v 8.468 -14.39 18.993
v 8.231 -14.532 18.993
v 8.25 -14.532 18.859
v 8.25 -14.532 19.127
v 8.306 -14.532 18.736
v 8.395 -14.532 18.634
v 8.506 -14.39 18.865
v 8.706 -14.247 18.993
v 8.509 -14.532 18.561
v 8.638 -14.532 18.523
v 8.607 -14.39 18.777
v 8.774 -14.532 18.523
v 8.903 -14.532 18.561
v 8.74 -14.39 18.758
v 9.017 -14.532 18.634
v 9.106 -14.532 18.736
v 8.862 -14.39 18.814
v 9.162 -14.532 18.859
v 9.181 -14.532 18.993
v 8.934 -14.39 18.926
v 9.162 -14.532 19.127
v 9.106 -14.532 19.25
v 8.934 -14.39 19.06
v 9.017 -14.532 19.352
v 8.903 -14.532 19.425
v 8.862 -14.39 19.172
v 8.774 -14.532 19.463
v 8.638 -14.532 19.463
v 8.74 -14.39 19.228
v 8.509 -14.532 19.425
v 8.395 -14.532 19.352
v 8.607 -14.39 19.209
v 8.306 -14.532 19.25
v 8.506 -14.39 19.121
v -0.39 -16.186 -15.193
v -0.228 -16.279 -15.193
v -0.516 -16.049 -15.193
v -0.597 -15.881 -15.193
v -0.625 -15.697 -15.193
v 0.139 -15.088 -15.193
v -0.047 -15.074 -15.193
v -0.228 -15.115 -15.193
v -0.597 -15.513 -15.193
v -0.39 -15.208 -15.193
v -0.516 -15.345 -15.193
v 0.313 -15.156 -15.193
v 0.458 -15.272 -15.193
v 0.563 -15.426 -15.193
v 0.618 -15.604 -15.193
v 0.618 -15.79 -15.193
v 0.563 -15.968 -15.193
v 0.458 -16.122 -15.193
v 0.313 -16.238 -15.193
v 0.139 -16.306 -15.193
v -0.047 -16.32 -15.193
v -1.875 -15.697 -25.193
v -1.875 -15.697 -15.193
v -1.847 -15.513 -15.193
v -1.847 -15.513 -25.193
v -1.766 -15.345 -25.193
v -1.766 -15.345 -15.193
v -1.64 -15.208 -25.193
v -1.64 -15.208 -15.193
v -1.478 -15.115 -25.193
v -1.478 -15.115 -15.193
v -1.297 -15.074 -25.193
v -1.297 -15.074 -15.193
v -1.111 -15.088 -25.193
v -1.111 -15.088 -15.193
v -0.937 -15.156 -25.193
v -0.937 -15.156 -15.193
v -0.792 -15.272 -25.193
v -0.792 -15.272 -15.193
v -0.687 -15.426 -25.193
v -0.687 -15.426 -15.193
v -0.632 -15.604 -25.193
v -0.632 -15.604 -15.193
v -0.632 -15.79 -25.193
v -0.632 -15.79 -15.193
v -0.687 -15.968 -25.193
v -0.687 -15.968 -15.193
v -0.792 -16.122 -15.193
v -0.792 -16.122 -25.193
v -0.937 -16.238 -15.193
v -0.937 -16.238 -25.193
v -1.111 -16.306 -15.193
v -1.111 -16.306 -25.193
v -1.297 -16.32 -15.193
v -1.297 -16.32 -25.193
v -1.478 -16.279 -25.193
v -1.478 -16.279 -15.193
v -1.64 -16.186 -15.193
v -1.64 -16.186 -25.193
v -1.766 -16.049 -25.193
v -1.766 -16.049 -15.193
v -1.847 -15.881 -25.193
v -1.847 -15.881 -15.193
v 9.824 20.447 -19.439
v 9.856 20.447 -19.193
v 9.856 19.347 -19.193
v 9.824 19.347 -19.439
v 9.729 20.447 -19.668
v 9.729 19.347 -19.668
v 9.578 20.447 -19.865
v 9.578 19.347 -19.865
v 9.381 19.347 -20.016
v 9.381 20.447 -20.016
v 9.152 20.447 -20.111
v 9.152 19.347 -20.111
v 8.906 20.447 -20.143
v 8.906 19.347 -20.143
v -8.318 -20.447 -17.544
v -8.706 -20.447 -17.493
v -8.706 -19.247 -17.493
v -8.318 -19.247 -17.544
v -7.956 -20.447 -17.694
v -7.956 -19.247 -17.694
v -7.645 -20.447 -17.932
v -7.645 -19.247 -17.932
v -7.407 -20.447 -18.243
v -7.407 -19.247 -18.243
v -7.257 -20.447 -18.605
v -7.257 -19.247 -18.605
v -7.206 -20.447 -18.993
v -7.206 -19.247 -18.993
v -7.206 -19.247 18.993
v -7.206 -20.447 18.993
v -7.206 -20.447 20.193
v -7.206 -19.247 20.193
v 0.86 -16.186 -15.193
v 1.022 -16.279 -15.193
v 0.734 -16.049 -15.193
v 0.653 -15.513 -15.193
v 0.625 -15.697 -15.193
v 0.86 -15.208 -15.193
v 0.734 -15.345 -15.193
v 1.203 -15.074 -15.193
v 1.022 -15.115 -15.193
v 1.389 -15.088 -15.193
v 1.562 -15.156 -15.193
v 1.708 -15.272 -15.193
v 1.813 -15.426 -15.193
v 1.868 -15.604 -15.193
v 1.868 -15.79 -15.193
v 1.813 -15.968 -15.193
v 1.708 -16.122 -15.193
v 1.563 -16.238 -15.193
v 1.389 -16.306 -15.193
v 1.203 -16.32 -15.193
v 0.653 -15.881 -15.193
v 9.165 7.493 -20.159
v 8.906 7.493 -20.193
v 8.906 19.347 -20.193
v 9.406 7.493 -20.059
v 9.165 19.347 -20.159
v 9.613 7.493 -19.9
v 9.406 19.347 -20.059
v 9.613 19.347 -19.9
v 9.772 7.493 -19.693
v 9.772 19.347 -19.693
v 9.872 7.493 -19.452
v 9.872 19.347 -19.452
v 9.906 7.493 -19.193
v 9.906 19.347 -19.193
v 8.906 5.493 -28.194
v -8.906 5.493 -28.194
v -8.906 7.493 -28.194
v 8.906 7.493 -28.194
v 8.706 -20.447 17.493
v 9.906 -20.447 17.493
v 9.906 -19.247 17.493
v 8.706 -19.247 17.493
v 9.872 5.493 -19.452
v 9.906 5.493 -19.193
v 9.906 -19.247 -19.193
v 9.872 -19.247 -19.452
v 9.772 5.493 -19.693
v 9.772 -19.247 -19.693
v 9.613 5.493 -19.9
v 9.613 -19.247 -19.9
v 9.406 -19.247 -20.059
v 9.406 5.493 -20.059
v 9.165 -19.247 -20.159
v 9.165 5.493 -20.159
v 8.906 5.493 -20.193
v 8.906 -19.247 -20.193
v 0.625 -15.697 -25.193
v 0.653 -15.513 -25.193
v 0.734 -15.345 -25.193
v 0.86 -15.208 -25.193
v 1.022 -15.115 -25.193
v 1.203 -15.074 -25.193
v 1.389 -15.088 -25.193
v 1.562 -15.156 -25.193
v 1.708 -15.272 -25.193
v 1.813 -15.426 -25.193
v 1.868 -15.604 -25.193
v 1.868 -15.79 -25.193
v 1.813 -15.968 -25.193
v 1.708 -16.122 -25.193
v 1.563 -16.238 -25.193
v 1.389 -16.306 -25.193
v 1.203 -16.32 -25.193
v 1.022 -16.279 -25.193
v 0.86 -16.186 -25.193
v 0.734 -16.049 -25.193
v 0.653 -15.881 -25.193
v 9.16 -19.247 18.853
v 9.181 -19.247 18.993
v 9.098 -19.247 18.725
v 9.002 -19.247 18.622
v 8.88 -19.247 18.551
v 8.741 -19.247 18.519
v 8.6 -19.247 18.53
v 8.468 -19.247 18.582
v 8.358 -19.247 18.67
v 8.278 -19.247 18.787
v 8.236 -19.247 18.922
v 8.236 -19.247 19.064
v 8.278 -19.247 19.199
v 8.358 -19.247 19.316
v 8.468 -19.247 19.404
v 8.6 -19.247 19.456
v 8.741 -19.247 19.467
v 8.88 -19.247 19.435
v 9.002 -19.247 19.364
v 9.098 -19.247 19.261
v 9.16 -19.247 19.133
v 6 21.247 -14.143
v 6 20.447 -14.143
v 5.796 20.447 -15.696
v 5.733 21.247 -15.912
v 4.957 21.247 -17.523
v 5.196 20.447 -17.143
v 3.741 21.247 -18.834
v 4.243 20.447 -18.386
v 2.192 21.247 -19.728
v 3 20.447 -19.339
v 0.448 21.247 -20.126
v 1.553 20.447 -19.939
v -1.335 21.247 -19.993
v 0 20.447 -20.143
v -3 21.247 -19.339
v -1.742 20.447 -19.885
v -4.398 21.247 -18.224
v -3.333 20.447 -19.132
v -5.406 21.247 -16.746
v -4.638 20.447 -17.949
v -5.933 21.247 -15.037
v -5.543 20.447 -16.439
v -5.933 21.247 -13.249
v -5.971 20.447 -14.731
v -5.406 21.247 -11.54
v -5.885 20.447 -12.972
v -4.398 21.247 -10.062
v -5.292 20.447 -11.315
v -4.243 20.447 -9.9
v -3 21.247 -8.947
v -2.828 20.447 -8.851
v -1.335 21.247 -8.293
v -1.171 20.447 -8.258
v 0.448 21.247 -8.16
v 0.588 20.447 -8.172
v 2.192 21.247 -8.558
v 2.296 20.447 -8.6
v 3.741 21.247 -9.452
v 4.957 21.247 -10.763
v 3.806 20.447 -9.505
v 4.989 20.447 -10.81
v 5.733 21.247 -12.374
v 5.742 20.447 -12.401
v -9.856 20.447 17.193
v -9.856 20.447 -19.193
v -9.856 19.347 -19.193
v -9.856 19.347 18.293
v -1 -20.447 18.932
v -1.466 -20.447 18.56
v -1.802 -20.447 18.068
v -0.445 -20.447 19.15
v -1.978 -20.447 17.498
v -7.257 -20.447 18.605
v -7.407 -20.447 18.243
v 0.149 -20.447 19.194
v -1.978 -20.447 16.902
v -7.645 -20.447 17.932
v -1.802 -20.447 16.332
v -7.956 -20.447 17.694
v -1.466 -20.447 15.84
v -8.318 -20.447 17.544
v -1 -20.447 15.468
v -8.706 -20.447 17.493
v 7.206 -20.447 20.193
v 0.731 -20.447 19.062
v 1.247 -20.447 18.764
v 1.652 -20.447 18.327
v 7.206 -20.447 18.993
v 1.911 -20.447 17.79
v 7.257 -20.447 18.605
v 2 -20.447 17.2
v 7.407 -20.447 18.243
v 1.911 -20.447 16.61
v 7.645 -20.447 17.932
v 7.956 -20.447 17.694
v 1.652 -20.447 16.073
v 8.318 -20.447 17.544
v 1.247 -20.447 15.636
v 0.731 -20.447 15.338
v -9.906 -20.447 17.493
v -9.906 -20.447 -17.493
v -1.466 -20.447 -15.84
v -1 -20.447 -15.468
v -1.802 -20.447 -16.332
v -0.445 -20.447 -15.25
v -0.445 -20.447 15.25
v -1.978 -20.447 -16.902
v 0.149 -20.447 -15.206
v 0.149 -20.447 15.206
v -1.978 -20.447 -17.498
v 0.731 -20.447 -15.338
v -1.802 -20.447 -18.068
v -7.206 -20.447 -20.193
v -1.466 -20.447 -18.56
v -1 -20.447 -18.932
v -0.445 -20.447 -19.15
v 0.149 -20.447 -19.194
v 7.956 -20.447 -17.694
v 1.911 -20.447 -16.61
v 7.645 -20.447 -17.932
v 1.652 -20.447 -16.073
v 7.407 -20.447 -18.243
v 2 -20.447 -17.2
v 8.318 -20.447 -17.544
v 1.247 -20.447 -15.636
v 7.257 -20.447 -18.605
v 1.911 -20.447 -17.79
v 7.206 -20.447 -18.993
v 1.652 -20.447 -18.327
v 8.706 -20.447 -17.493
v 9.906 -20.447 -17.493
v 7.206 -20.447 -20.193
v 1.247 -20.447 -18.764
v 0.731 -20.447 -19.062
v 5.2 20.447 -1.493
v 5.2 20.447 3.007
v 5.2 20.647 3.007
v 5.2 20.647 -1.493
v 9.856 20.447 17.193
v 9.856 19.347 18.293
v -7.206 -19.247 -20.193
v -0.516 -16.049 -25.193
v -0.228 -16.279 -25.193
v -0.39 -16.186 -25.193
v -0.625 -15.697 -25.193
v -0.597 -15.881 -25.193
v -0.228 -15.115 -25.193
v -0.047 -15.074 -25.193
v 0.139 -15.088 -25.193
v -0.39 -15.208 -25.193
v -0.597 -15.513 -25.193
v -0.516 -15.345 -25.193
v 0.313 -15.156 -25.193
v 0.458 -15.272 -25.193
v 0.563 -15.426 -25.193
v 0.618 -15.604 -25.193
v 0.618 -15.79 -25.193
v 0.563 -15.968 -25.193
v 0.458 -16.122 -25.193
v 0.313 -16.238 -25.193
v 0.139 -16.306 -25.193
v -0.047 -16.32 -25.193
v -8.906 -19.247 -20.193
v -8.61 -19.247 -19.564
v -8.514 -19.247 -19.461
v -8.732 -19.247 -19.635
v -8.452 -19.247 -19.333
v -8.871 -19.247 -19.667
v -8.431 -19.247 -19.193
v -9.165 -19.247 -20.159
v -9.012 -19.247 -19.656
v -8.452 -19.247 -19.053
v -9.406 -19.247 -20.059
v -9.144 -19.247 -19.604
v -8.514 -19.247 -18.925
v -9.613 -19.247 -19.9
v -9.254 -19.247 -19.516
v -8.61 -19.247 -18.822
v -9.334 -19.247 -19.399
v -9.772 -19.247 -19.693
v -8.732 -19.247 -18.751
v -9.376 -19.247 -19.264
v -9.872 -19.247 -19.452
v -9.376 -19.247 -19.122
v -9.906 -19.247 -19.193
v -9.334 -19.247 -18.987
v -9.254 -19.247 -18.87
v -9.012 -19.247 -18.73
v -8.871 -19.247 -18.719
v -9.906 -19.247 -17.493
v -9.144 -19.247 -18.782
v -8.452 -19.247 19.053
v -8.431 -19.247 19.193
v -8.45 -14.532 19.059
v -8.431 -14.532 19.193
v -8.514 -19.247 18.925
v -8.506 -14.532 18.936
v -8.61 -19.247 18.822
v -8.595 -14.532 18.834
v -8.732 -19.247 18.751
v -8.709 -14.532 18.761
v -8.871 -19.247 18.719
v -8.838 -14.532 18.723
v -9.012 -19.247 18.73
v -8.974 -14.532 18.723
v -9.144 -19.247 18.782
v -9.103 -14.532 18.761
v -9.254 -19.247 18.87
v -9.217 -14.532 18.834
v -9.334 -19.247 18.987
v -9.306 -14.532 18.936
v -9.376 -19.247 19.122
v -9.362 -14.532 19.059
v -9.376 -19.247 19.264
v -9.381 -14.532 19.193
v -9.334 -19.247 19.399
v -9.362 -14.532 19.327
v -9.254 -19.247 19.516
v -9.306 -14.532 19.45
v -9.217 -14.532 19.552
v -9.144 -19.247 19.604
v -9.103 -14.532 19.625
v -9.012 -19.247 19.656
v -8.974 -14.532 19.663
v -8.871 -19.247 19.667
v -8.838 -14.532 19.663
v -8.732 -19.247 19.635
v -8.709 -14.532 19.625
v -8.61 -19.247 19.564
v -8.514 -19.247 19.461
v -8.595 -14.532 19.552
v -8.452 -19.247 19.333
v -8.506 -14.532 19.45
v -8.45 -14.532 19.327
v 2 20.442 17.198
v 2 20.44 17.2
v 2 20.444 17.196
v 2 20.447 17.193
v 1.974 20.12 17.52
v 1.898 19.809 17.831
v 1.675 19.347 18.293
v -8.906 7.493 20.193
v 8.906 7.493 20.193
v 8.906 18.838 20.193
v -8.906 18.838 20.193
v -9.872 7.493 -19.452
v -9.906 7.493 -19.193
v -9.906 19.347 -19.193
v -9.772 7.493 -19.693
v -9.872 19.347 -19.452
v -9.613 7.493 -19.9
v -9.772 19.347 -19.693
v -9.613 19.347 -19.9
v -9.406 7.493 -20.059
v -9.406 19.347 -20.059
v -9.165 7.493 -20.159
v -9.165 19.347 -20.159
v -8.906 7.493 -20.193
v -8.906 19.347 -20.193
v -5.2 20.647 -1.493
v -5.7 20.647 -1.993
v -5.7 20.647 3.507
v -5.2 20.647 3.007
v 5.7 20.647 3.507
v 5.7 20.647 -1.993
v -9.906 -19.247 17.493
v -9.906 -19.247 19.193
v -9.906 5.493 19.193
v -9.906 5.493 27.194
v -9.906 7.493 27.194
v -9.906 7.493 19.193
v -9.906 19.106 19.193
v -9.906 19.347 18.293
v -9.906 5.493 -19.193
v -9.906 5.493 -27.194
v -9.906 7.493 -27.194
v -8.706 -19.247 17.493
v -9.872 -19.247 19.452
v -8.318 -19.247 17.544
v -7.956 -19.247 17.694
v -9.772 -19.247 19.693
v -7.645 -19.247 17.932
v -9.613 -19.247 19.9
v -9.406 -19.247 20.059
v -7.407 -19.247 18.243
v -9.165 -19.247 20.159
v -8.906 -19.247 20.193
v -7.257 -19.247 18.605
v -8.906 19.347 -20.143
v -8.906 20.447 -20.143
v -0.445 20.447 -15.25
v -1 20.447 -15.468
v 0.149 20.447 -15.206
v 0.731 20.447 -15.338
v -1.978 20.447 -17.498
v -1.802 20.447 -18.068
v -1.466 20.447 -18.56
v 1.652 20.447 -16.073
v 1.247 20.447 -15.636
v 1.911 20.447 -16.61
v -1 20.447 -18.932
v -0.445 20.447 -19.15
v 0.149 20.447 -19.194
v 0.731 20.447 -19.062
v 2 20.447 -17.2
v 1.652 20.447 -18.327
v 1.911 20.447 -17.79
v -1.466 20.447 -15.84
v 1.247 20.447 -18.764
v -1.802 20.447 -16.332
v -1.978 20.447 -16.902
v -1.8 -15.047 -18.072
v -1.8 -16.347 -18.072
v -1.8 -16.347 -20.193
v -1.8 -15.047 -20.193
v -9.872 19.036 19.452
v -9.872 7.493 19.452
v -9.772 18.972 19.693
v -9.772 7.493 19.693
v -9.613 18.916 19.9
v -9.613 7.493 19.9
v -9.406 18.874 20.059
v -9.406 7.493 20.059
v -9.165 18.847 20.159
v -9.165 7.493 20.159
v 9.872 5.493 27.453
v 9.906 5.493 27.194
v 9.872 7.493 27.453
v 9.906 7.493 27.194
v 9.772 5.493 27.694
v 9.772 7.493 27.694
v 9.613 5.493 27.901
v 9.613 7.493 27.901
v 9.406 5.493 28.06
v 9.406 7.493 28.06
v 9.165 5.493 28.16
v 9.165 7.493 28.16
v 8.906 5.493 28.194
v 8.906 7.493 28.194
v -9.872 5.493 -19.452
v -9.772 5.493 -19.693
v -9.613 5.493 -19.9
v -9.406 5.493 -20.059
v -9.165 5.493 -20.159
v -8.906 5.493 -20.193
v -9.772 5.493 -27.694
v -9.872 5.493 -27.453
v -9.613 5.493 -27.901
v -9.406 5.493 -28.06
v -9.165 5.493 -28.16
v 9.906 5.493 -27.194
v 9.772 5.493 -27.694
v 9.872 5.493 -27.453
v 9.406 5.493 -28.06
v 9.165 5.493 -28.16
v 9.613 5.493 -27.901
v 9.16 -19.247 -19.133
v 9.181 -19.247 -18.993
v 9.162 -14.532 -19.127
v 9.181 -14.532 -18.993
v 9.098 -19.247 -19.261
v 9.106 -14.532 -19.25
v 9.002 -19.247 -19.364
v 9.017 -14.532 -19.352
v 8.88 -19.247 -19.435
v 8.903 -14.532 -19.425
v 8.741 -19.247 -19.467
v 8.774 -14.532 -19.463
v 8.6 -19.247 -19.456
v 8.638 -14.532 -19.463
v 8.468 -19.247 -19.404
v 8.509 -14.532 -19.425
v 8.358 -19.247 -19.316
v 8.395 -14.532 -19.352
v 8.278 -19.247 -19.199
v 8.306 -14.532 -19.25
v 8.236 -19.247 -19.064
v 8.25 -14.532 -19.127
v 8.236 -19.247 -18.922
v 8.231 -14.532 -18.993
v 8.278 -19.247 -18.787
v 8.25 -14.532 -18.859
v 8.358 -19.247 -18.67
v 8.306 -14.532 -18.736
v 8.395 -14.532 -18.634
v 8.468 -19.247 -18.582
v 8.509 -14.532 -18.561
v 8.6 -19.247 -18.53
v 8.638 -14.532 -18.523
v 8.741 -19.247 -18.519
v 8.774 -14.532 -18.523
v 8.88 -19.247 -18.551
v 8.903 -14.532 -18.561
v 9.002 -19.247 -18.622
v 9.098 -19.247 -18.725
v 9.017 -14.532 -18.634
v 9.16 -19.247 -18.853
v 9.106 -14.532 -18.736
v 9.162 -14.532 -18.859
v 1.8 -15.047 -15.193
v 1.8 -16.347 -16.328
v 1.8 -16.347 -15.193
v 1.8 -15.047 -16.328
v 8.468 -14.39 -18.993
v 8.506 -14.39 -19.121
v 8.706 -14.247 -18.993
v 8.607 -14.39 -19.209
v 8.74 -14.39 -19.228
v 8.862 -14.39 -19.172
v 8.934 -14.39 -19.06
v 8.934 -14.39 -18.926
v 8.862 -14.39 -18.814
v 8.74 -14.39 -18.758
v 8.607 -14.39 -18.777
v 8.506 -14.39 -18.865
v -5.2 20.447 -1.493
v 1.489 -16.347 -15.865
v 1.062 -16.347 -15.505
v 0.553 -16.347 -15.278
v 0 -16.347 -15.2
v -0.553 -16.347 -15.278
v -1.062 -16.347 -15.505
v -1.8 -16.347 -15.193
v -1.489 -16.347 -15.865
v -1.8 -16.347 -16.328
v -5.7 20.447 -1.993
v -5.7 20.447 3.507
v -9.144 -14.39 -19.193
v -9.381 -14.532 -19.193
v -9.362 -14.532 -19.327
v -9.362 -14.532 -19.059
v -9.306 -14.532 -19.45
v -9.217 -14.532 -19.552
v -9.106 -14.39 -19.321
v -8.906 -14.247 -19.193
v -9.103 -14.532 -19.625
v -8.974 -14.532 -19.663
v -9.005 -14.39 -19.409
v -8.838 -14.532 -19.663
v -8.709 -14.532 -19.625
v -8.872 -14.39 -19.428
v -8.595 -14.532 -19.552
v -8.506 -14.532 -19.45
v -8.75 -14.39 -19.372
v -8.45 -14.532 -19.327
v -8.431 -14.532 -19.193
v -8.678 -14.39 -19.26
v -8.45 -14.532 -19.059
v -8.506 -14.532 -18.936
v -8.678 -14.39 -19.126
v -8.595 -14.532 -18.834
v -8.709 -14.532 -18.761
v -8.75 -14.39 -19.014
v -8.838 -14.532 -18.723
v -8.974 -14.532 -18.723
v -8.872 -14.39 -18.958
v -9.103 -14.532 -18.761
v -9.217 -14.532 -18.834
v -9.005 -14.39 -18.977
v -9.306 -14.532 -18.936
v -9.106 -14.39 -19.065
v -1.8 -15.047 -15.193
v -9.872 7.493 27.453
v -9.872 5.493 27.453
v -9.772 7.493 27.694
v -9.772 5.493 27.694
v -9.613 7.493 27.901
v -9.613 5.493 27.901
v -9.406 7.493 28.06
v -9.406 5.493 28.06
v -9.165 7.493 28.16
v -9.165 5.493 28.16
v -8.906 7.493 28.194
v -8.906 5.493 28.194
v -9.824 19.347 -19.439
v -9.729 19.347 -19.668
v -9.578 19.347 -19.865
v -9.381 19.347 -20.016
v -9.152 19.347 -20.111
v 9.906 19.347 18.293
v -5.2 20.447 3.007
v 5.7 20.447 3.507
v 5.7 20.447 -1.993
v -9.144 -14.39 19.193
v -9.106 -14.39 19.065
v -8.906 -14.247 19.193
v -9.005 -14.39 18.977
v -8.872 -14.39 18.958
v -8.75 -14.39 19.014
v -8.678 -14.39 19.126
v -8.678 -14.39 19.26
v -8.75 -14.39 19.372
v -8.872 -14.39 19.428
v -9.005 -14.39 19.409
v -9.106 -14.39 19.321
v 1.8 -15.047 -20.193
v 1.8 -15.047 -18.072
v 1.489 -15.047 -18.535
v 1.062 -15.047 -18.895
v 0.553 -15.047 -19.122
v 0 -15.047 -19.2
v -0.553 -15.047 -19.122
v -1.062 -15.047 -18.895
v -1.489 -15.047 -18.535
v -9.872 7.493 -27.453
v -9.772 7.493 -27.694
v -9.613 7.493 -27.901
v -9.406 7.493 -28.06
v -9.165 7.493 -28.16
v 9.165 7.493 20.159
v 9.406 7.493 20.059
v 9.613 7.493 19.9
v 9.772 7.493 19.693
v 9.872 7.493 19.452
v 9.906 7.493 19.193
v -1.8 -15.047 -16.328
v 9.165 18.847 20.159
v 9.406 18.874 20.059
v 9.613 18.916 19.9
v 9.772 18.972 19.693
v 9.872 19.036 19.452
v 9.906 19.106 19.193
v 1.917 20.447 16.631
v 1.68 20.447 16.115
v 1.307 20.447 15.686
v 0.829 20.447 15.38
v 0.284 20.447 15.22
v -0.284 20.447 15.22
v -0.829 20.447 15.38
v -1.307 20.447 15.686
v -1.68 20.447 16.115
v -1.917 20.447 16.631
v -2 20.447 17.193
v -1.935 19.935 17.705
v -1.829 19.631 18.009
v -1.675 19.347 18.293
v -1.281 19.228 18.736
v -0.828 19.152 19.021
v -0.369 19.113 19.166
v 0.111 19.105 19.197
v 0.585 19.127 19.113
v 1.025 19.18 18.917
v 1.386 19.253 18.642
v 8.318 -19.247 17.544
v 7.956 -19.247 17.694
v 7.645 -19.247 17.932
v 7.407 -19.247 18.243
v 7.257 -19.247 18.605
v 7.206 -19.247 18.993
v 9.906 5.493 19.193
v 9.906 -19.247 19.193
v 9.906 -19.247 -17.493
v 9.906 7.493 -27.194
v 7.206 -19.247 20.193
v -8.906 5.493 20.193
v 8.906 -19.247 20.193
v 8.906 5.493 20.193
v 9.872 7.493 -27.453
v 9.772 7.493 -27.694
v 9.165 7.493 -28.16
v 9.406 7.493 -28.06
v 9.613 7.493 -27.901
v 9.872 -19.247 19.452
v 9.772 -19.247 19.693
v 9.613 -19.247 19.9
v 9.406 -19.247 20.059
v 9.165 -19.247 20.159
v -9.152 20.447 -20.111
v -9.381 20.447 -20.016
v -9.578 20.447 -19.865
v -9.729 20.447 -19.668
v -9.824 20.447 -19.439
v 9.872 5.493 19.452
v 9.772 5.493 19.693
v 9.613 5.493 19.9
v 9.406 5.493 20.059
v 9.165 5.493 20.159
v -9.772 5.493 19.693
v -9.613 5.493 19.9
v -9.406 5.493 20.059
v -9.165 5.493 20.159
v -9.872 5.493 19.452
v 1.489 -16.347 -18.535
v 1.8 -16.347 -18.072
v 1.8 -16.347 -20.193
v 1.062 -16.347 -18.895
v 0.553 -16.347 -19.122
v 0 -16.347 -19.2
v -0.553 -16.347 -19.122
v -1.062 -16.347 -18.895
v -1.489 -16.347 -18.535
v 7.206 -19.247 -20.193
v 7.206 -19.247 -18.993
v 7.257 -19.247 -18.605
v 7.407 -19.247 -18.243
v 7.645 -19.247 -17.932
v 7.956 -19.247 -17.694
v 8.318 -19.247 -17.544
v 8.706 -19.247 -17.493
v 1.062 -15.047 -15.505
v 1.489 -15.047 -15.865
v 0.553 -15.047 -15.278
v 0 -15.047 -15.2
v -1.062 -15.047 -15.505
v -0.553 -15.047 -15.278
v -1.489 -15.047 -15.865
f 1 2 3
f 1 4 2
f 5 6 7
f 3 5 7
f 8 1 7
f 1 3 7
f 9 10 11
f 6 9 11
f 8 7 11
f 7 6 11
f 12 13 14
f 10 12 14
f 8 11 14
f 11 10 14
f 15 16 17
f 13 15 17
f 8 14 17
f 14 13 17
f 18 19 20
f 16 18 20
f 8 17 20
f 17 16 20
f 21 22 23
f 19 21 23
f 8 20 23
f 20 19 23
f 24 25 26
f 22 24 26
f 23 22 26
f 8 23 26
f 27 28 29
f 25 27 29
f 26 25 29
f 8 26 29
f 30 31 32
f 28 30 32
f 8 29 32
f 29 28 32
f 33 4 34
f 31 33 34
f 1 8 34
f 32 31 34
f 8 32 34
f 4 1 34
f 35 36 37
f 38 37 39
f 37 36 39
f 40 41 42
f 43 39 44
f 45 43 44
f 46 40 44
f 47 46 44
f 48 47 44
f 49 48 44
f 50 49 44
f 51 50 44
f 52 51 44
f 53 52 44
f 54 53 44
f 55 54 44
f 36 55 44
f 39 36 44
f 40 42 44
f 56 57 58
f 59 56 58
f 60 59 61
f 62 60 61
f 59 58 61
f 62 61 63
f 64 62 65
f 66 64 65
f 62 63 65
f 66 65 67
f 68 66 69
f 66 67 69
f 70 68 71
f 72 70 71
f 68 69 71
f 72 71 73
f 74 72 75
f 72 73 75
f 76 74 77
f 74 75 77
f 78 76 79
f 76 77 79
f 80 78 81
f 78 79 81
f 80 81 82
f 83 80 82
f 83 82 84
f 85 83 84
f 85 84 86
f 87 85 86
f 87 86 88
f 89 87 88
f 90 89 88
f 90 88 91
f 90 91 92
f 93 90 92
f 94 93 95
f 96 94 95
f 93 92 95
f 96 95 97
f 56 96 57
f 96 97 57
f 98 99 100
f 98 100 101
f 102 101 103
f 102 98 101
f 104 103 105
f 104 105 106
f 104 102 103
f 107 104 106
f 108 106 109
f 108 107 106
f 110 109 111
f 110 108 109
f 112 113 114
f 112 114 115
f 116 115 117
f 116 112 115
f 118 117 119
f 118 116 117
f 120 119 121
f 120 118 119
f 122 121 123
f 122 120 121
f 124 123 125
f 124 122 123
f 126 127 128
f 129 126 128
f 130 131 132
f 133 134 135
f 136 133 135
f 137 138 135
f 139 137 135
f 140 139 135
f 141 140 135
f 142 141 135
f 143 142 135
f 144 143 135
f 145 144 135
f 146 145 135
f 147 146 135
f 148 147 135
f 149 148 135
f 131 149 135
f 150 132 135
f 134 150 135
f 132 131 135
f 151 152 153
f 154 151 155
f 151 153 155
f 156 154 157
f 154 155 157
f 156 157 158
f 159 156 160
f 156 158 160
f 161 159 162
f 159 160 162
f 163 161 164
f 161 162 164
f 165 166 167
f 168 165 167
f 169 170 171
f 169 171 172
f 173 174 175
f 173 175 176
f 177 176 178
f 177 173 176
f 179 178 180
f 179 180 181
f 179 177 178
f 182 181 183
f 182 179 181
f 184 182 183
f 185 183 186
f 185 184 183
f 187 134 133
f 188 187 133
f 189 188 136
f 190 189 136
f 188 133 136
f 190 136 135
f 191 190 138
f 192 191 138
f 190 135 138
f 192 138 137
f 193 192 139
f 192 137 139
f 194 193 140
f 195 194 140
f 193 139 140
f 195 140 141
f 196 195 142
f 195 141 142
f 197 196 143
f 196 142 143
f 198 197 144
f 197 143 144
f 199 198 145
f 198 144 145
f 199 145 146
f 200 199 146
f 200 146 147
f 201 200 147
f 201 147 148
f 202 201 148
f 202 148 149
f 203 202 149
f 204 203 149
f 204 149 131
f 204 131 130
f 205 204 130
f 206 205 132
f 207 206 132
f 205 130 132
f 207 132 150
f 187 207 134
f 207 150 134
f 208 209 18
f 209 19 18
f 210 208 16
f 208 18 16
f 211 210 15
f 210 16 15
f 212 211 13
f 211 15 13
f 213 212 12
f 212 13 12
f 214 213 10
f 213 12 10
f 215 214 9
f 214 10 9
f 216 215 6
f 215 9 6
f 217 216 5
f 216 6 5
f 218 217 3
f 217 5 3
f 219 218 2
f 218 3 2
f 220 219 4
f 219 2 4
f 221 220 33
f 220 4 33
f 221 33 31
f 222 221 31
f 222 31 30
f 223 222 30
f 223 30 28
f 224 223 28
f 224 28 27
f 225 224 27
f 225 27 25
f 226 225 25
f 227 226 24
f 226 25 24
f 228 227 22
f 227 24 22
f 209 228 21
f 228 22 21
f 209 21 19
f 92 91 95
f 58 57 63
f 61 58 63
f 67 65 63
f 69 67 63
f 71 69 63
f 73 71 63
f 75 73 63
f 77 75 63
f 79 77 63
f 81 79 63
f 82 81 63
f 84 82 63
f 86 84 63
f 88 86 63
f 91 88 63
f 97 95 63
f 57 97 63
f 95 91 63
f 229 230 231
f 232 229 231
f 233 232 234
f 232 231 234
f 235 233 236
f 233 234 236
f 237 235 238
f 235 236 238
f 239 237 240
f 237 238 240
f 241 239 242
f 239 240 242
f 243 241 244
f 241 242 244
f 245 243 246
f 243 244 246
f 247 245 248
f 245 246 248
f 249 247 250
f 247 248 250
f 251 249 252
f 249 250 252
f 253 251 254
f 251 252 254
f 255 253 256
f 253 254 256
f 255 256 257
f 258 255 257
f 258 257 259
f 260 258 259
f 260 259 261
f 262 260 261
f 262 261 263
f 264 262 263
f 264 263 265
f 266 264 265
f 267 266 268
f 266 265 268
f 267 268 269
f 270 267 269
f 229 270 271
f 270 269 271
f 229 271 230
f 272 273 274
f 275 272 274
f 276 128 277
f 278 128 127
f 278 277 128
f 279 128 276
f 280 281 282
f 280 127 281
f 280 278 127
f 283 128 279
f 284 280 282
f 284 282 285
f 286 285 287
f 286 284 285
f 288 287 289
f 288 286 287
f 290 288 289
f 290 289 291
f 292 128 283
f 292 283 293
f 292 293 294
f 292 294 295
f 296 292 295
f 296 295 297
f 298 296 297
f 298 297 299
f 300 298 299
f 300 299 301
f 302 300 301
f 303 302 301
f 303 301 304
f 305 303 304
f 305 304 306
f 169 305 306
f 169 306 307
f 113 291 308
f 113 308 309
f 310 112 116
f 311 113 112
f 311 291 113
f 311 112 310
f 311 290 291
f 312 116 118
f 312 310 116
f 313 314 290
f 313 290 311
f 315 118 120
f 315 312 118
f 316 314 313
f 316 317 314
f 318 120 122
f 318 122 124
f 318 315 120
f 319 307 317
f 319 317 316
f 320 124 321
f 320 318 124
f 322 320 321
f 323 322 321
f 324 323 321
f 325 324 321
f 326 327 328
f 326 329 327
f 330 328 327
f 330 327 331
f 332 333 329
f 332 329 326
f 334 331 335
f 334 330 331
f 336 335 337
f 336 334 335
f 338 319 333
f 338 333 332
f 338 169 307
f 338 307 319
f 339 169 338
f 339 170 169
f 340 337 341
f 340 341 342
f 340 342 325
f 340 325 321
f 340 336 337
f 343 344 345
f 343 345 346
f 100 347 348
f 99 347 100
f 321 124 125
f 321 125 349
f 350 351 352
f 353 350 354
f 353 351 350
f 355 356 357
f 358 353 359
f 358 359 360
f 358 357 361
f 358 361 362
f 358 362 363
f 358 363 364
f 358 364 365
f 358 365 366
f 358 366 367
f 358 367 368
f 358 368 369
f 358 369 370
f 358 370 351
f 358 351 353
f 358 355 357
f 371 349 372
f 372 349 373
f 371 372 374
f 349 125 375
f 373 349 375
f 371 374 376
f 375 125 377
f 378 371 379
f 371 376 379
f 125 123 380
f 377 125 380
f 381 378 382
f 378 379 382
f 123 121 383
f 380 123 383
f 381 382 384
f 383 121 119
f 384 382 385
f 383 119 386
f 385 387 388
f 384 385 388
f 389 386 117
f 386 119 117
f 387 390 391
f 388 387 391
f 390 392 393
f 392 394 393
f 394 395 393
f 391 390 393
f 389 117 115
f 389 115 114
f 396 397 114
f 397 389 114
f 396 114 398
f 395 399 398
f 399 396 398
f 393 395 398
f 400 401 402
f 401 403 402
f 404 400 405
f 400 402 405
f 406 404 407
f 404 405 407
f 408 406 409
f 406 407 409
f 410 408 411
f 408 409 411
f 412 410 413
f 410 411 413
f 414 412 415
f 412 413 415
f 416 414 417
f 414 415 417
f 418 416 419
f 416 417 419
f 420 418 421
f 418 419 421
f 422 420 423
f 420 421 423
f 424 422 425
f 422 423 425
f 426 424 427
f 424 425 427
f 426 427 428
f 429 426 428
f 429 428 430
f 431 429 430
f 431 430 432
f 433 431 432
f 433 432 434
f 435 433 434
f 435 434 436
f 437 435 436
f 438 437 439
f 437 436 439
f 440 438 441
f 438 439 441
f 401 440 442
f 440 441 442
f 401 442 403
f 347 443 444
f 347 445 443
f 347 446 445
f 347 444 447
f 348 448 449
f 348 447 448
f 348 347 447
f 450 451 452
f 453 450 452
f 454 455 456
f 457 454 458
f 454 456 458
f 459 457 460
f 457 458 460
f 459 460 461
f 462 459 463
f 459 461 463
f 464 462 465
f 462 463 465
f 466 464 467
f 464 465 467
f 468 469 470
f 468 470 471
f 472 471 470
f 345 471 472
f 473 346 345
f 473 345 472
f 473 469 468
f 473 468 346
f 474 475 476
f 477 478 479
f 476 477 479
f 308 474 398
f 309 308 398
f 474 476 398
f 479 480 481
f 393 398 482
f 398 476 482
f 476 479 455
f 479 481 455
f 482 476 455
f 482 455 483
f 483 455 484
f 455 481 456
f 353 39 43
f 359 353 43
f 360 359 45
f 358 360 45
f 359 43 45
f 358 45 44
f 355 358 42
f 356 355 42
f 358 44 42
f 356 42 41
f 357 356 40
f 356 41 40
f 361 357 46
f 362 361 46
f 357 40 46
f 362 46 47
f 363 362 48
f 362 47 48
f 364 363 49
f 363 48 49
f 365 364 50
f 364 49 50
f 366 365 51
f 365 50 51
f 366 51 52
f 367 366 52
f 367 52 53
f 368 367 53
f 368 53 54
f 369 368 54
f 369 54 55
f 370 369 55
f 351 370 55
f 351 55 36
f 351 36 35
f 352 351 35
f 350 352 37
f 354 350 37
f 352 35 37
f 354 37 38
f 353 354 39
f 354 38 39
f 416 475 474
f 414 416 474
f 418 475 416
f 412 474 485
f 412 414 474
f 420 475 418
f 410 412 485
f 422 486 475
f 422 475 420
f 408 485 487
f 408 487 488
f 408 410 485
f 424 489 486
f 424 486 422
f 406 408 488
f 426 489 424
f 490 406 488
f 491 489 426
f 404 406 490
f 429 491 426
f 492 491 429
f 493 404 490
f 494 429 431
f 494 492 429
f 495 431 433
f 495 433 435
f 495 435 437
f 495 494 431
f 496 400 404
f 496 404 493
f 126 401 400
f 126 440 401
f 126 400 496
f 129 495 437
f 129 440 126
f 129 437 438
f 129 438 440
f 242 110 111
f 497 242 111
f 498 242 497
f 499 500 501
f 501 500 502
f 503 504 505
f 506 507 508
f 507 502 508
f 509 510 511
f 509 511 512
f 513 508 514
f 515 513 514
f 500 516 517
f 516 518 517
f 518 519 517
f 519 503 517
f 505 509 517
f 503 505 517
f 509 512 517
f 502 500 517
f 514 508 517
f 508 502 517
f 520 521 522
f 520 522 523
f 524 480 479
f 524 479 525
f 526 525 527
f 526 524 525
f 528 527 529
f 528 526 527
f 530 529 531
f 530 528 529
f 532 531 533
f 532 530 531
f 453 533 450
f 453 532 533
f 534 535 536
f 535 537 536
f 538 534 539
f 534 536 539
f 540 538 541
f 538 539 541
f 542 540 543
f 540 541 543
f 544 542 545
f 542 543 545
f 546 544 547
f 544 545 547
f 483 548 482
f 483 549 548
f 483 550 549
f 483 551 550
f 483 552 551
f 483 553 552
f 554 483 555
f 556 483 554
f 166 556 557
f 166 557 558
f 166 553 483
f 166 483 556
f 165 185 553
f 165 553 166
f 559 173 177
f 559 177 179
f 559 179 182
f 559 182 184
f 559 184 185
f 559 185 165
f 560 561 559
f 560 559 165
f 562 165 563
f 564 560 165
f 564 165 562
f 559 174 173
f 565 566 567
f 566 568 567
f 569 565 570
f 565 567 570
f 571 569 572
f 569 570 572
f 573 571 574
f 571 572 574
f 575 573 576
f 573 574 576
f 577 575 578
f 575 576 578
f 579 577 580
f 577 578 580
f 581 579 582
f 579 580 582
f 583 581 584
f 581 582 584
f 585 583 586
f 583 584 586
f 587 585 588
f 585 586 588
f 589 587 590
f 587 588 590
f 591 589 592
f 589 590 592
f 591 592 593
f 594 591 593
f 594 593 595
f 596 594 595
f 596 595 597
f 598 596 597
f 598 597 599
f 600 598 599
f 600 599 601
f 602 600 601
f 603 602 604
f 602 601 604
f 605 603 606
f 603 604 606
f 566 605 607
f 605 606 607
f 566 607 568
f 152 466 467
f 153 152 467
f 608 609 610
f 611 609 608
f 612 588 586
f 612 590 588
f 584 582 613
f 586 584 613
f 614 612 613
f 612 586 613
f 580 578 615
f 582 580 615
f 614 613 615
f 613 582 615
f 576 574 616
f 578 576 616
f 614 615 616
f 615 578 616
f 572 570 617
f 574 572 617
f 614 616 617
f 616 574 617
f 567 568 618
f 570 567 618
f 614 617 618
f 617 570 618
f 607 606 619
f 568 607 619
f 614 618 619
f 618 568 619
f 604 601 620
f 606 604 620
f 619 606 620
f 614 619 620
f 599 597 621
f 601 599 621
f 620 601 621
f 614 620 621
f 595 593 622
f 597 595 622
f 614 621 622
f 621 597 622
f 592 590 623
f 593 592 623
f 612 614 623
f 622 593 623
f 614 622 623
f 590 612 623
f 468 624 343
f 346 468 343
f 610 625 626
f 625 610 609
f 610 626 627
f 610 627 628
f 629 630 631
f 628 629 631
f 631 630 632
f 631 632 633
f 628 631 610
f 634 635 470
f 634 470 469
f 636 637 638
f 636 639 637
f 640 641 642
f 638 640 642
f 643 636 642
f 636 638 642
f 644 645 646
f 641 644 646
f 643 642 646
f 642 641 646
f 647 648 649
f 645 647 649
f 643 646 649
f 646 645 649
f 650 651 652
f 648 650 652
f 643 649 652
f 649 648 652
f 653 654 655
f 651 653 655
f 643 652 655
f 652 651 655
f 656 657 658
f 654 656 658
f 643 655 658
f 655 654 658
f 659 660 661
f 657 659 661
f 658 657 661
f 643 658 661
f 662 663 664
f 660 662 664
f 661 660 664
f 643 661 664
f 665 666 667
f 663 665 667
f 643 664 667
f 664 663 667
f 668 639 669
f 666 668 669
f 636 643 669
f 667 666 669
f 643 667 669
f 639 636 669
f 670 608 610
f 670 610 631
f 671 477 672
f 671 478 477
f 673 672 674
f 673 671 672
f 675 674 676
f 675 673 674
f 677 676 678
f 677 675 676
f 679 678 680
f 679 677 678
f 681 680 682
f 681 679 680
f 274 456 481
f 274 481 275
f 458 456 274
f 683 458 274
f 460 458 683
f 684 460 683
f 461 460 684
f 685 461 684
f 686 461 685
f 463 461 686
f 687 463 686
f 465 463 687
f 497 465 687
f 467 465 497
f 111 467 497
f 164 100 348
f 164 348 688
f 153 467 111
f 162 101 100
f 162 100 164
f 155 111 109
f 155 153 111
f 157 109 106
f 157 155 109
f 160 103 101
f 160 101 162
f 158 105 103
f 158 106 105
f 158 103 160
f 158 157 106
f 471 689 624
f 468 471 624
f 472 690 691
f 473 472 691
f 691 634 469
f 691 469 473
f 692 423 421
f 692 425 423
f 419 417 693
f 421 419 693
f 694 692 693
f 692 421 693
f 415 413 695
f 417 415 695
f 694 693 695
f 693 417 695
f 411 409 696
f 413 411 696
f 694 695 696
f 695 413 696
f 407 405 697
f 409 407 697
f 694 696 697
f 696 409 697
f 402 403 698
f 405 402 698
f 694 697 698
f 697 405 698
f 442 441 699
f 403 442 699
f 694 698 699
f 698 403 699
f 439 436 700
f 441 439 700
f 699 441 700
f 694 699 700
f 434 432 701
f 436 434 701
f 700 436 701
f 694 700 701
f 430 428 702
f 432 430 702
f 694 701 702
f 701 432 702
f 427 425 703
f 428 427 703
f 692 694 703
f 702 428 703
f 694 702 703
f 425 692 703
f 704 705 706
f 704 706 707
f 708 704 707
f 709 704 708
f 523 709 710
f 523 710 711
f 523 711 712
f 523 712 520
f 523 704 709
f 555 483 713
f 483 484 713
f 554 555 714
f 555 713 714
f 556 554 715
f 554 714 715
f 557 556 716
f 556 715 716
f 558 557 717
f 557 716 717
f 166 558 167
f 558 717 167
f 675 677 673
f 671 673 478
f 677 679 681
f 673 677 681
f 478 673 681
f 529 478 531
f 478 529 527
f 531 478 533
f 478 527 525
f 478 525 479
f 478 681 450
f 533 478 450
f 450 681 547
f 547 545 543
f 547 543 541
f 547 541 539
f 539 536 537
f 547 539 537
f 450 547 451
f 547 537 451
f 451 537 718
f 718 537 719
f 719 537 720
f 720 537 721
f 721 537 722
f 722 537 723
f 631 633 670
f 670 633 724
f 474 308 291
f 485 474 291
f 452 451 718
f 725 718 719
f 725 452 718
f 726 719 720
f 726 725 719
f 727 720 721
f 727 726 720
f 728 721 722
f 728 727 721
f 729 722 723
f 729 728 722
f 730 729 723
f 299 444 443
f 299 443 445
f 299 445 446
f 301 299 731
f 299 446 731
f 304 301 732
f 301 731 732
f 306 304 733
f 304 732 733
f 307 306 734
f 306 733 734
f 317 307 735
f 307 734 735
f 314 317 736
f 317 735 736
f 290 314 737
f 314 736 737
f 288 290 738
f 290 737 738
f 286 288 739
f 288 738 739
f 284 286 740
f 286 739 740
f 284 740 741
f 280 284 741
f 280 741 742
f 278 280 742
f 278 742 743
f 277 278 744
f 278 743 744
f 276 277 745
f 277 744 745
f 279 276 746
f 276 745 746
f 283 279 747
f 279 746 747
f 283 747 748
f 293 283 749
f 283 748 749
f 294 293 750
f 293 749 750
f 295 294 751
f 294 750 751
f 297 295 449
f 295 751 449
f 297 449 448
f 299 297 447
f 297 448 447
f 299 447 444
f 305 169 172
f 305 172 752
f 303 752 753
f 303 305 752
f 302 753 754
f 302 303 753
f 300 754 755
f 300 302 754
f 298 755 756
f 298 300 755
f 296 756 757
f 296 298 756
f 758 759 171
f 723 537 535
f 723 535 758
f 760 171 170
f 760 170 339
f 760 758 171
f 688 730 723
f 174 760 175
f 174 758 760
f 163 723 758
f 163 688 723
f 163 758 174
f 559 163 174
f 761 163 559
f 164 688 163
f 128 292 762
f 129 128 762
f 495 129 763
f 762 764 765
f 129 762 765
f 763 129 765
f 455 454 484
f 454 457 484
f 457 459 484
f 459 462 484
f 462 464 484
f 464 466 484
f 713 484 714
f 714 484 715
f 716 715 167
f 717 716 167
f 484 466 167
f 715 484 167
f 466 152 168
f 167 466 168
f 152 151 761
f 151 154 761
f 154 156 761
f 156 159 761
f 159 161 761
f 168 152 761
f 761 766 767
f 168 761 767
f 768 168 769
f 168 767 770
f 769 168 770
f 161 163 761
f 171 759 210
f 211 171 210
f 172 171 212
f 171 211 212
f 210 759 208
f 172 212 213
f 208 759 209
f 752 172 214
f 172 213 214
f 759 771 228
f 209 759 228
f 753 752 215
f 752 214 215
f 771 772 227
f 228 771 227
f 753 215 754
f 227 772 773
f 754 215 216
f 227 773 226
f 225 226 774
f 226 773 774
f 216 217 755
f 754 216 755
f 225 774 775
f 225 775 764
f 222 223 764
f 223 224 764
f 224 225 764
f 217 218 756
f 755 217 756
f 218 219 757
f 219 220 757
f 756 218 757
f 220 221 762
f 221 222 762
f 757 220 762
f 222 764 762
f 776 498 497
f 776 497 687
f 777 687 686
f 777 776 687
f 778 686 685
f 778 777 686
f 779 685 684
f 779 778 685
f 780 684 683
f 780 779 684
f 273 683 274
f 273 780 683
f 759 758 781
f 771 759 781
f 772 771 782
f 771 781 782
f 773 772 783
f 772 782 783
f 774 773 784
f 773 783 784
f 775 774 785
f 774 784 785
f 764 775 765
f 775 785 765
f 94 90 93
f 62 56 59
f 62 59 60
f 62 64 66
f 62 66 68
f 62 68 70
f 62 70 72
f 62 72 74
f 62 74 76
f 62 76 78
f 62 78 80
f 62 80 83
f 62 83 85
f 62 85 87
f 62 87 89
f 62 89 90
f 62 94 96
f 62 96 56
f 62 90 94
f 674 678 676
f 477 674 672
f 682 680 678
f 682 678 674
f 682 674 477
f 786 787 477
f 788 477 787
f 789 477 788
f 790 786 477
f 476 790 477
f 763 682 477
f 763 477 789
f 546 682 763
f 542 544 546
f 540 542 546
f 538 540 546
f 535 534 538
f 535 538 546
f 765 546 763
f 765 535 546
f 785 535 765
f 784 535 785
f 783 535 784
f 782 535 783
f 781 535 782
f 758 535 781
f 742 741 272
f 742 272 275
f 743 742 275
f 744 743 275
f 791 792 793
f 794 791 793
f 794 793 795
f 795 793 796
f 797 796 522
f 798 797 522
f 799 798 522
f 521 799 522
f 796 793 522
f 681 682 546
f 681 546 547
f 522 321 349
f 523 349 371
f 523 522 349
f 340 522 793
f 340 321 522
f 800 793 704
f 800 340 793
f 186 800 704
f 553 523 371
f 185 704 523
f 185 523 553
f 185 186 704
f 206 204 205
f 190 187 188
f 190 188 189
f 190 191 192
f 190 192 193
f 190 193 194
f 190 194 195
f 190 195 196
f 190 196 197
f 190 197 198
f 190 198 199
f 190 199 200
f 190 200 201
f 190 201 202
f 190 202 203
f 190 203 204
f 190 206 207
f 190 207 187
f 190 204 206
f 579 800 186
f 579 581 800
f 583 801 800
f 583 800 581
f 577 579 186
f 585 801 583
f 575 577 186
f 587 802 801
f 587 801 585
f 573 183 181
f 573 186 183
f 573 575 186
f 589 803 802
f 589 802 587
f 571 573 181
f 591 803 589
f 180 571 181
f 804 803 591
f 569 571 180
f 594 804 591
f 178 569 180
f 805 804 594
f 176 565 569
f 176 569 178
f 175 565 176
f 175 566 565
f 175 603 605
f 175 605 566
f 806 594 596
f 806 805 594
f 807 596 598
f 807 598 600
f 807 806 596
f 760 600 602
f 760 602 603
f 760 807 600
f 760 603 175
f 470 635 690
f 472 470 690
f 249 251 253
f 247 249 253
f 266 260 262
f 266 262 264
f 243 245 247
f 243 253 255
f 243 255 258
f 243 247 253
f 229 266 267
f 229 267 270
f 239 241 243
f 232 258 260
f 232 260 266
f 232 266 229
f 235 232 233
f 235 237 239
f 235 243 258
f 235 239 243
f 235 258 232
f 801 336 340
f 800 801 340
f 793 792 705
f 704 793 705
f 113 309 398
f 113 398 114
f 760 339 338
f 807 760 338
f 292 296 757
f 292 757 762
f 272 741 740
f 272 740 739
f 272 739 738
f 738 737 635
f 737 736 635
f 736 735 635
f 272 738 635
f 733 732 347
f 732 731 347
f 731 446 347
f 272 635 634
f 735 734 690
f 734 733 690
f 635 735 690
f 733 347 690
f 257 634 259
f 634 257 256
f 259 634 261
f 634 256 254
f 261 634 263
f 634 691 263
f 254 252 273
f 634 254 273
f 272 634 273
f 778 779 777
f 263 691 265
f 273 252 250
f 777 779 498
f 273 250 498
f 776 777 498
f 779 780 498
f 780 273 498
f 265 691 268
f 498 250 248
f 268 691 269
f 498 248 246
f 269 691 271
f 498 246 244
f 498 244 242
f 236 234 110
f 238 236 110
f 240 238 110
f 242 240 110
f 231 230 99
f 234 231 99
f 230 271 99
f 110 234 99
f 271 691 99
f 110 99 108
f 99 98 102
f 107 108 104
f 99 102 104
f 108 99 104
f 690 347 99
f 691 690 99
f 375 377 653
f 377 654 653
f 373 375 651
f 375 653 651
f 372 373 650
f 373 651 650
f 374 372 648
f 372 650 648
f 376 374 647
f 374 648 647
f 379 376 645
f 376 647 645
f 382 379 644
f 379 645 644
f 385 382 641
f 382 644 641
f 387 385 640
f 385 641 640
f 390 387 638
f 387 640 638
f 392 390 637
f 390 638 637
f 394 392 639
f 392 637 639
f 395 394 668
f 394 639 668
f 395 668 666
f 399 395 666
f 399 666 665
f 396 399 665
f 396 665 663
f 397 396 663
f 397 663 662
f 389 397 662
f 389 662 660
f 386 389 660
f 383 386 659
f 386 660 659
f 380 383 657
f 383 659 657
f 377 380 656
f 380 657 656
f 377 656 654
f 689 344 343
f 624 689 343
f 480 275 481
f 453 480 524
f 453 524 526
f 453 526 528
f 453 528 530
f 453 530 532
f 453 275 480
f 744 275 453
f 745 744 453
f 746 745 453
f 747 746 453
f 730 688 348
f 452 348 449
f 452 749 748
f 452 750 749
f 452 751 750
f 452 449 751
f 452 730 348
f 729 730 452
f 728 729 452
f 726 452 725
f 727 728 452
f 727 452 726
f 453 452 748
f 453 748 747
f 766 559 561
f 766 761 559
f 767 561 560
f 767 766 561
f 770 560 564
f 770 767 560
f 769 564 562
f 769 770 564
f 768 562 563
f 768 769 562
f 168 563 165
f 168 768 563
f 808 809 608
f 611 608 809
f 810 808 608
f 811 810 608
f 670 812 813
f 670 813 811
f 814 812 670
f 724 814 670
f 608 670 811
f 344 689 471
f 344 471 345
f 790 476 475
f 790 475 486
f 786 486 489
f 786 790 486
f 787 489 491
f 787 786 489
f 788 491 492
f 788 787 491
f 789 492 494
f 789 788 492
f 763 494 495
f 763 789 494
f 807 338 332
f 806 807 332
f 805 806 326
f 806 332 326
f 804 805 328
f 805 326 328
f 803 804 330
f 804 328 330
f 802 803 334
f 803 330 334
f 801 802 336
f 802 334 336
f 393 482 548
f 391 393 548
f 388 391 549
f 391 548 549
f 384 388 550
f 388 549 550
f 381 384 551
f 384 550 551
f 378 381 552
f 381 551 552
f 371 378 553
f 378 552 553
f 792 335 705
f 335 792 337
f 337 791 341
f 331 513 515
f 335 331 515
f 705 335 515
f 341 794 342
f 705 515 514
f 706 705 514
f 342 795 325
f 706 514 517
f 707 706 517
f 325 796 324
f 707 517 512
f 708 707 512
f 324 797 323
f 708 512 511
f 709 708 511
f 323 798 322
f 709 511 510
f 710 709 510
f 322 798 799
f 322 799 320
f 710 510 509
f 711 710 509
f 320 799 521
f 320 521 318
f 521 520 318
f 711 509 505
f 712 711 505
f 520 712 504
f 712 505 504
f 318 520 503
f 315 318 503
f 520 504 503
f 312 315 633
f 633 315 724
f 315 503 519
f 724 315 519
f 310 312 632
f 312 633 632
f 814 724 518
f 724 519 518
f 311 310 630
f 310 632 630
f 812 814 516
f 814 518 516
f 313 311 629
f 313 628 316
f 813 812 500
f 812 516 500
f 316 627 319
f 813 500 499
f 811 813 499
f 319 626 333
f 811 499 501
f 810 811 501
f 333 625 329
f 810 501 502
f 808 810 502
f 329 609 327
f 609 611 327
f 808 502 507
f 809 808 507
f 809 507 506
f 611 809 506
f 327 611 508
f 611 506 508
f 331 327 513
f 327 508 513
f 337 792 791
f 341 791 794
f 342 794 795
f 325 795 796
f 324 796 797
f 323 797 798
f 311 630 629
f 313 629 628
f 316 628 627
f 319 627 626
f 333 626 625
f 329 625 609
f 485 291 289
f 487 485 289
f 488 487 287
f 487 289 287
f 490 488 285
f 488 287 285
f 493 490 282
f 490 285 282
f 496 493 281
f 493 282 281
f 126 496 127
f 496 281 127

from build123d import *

# Parameters (mm, degrees)
ESQUISSE1_W                                   = 40.386
ESQUISSE1_H                                   = 40.894
BOSS_EXTRU_1_DEPTH                            = 9.906
ESQUISSE3_W                                   = 8.001
ESQUISSE3_H                                   = 2
BOSS_EXTRU_2_DEPTH                            = 19.812
ESQUISSE6_R                                   = 2
ENL_V_MAT_EXTRU_1_DEPTH                       = 13.954000064
ENL_V_MAT_EXTRU_1_DEPTH_BACK                  = 28.939999936
ESQUISSE5_R                                   = 6
BOSS_EXTRU_3_DEPTH                            = 0.8
CONG_2_R                                      = 1
ENL_V_MAT_EXTRU_2_DEPTH                       = 1.1
ENL_V_MAT_EXTRU_3_DEPTH                       = 1
ENL_V_MAT_EXTRU_3_DEPTH_BACK                  = 20.812
ESQUISSE9_W                                   = 11.4
ESQUISSE9_H                                   = 5.5
ESQUISSE9_W_2                                 = 10.4
ESQUISSE9_H_2                                 = 4.5
EXTRU_MINCE1_DEPTH                            = 0.2
ENL_V_MAT_EXTRU_4_DEPTH                       = 1
ENL_V_MAT_EXTRU_4_DEPTH_BACK                  = 1.2
TROU_POUR_TARAUDAGE_POUR_TROU_TARAUD_M1_D     = 0.95
TROU_POUR_TARAUDAGE_POUR_TROU_TARAUD_M1_DEPTH = 4.714591206
TROU_POUR_TARAUDAGE_POUR_TROU_TARAUD_M1_TIP   = 0.285408794
ESQUISSE16_W                                  = 3.6
ESQUISSE16_H                                  = 1.3
ENL_V_MAT_EXTRU_5_DEPTH                       = 5
ESQUISSE17_R                                  = 0.625
BOSS_EXTRU_5_DEPTH                            = 10
BOSS_EXTRU_5_2_DEPTH                          = 10
BOSS_EXTRU_5_3_DEPTH                          = 10


with BuildPart() as part:
    # Esquisse1 → Boss.-Extru.1 (new body, symmetric)
    with BuildSketch(Plane(origin=(0, 0, 0), x_dir=(0, 0, -1), z_dir=(1, 0, 0))):
        Rectangle(ESQUISSE1_W, ESQUISSE1_H)
    extrude(amount=BOSS_EXTRU_1_DEPTH, both=True)

    # Esquisse3 → Boss.-Extru.2 (add)
    with BuildSketch(Plane(origin=(9.906, 0, 0), x_dir=(0, 0, -1), z_dir=(1, 0, 0))):
        with Locations((-24.1935, 6.492999936)):
            Rectangle(ESQUISSE3_W, ESQUISSE3_H)
        with Locations((24.1935, 6.492999936)):
            Rectangle(ESQUISSE3_W, ESQUISSE3_H)
    extrude(amount=-BOSS_EXTRU_2_DEPTH)

    # Esquisse6 → Enlèv. mat.-Extru.1 (cut, two sides)
    with BuildSketch(Plane(origin=(0, 7.492999936, 0), x_dir=(1, 0, 0), z_dir=(0, 1, 0))) as enl_v_mat_extru_1_sk:
        with Locations((0, 17.2)):
            Circle(ESQUISSE6_R)
        with Locations((0, -17.2)):
            Circle(ESQUISSE6_R)
    extrude(amount=ENL_V_MAT_EXTRU_1_DEPTH, mode=Mode.SUBTRACT)
    extrude(enl_v_mat_extru_1_sk.sketch, amount=-ENL_V_MAT_EXTRU_1_DEPTH_BACK, mode=Mode.SUBTRACT)

    # Esquisse5 → Boss.-Extru.3 (add)
    with BuildSketch(Plane(origin=(0, 20.447, 0), x_dir=(1, 0, 0), z_dir=(0, 1, 0))):
        with Locations((0, 14.143)):
            Circle(ESQUISSE5_R)
    extrude(amount=BOSS_EXTRU_3_DEPTH)

    # Congé2
    cong_2_edges = [part.edges().sort_by_distance(p)[0] for p in [
        (9.906, -7.477000032, -20.193),
        (-9.906, 13.969999968, -20.193),
        (9.906, 13.969999968, -20.193),
        (-9.906, -7.477000032, 20.193),
        (9.906, -7.477000032, 20.193),
        (9.906, 6.492999936, 28.194),
        (-9.906, 6.492999936, 28.194),
        (9.906, 6.492999936, -28.194),
        (-9.906, 6.492999936, -28.194),
        (9.906, 13.969999968, 20.193),
        (-9.906, -7.477000032, -20.193),
        (-9.906, 13.969999968, 20.193),
    ]]
    fillet(cong_2_edges, radius=CONG_2_R)

    # Esquisse7 → Enlèv. mat.-Extru.2 (cut)
    with BuildSketch(Plane(origin=(0, 20.447, 0), x_dir=(1, 0, 0), z_dir=(0, 1, 0))):
        with BuildLine():
            Line((8.906, 20.193), (-8.906, 20.193))
            ThreePointArc((-8.906, 20.193), (-9.613106781, 19.900106781), (-9.906, 19.193))
            Line((-9.906, 19.193), (-9.906, -19.193))
            ThreePointArc((-9.906, -19.193), (-9.613106781, -19.900106781), (-8.906, -20.193))
            Line((-8.906, -20.193), (8.906, -20.193))
            ThreePointArc((8.906, -20.193), (9.613106781, -19.900106781), (9.906, -19.193))
            Line((9.906, -19.193), (9.906, 19.193))
            ThreePointArc((9.906, 19.193), (9.613106781, 19.900106781), (8.906, 20.193))
        make_face()
        with BuildLine():
            Line((8.906, 20.143), (-8.906, 20.143))
            ThreePointArc((-8.906, 20.143), (-9.577751442, 19.864751442), (-9.856, 19.193))
            Line((-9.856, 19.193), (-9.856, -19.193))
            ThreePointArc((-9.856, -19.193), (-9.577751442, -19.864751442), (-8.906, -20.143))
            Line((-8.906, -20.143), (8.906, -20.143))
            ThreePointArc((8.906, -20.143), (9.577751442, -19.864751442), (9.856, -19.193))
            Line((9.856, -19.193), (9.856, 19.193))
            ThreePointArc((9.856, 19.193), (9.577751442, 19.864751442), (8.906, 20.143))
        make_face(mode=Mode.SUBTRACT)
    extrude(amount=-ENL_V_MAT_EXTRU_2_DEPTH, mode=Mode.SUBTRACT)

    # Esquisse8 → Enlèv. mat.-Extru.3 (cut, two sides)
    with BuildSketch(Plane(origin=(9.906, 0, 0), x_dir=(0, 0, -1), z_dir=(1, 0, 0))) as enl_v_mat_extru_3_sk:
        Polygon((-17.193, 20.447), (-18.293, 19.347), (-20.193, 18.837896534), (-20.193, 20.447), align=None)
    extrude(amount=ENL_V_MAT_EXTRU_3_DEPTH, mode=Mode.SUBTRACT)
    extrude(enl_v_mat_extru_3_sk.sketch, amount=-ENL_V_MAT_EXTRU_3_DEPTH_BACK, mode=Mode.SUBTRACT)

    # Esquisse9 → Extru.-Mince1 (add)
    with BuildSketch(Plane(origin=(0, 20.447, 0), x_dir=(1, 0, 0), z_dir=(0, 1, 0))):
        with Locations((0, -0.757)):
            Rectangle(ESQUISSE9_W, ESQUISSE9_H)
        with Locations((0, -0.757)):
            Rectangle(ESQUISSE9_W_2, ESQUISSE9_H_2, mode=Mode.SUBTRACT)
    extrude(amount=EXTRU_MINCE1_DEPTH)

    # Esquisse13 → Enlèv. mat.-Extru.4 (cut, two sides)
    with BuildSketch(Plane.XZ.offset(20.447)) as enl_v_mat_extru_4_sk:
        with BuildLine():
            Line((-7.206, 20.193), (-9.906, 20.193))
            Line((-9.906, 20.193), (-9.906, 17.493))
            Line((-9.906, 17.493), (-8.706, 17.493))
            ThreePointArc((-8.706, 17.493), (-7.645339828, 17.932339828), (-7.206, 18.993))
            Line((-7.206, 18.993), (-7.206, 20.193))
        make_face()
        with BuildLine():
            Line((9.906, 20.193), (9.906, 17.493))
            Line((9.906, 17.493), (8.706, 17.493))
            ThreePointArc((8.706, 17.493), (7.645339828, 17.932339828), (7.206, 18.993))
            Line((7.206, 18.993), (7.206, 20.193))
            Line((7.206, 20.193), (9.906, 20.193))
        make_face()
        with BuildLine():
            Line((7.206, -20.193), (9.906, -20.193))
            Line((9.906, -20.193), (9.906, -17.493))
            Line((9.906, -17.493), (8.706, -17.493))
            ThreePointArc((8.706, -17.493), (7.645339828, -17.932339828), (7.206, -18.993))
            Line((7.206, -18.993), (7.206, -20.193))
        make_face()
        with BuildLine():
            Line((-9.906, -20.193), (-9.906, -17.493))
            Line((-9.906, -17.493), (-8.706, -17.493))
            ThreePointArc((-8.706, -17.493), (-7.645339828, -17.932339828), (-7.206, -18.993))
            Line((-7.206, -18.993), (-7.206, -20.193))
            Line((-7.206, -20.193), (-9.906, -20.193))
        make_face()
    extrude(amount=ENL_V_MAT_EXTRU_4_DEPTH, mode=Mode.SUBTRACT)
    extrude(enl_v_mat_extru_4_sk.sketch, amount=-ENL_V_MAT_EXTRU_4_DEPTH_BACK, mode=Mode.SUBTRACT)

    # Trou pour taraudage pour trou taraudé M1.2x0.251
    with Locations(Plane(origin=(0, -19.247, 0), x_dir=(-1, 0, 0), z_dir=(0, -1, 0))):
        with Locations((-8.706, -18.993), (8.906, -19.193), (-8.706, 18.993), (8.906, 19.193)):
            Hole(TROU_POUR_TARAUDAGE_POUR_TROU_TARAUD_M1_D / 2, depth=TROU_POUR_TARAUDAGE_POUR_TROU_TARAUD_M1_DEPTH)
            with Locations((0, 0, -(TROU_POUR_TARAUDAGE_POUR_TROU_TARAUD_M1_DEPTH + TROU_POUR_TARAUDAGE_POUR_TROU_TARAUD_M1_TIP / 2))):  # 118° drill point
                Cone(0, TROU_POUR_TARAUDAGE_POUR_TROU_TARAUD_M1_D / 2, TROU_POUR_TARAUDAGE_POUR_TROU_TARAUD_M1_TIP, mode=Mode.SUBTRACT)

    # Esquisse16 → Enlèv. mat.-Extru.5 (cut)
    with BuildSketch(Plane(origin=(0, 0, -20.193), x_dir=(-1, 0, 0), z_dir=(0, 0, -1))):
        with Locations((0, -15.697)):
            Rectangle(ESQUISSE16_W, ESQUISSE16_H)
    extrude(amount=-ENL_V_MAT_EXTRU_5_DEPTH, mode=Mode.SUBTRACT)


with BuildPart() as body_2:
    # Esquisse17 → Boss.-Extru.5 (new body)
    with BuildSketch(Plane(origin=(0, 0, -15.193), x_dir=(-1, 0, 0), z_dir=(0, 0, -1))):
        with Locations((0, -15.697)):
            Circle(ESQUISSE17_R)
    extrude(amount=BOSS_EXTRU_5_DEPTH)


with BuildPart() as body_3:
    # Esquisse17 → Boss.-Extru.5 2 (new body)
    with BuildSketch(Plane(origin=(0, 0, -15.193), x_dir=(-1, 0, 0), z_dir=(0, 0, -1))):
        with Locations((-1.25, -15.697)):
            Circle(ESQUISSE17_R)
    extrude(amount=BOSS_EXTRU_5_2_DEPTH)


with BuildPart() as body_4:
    # Esquisse17 → Boss.-Extru.5 3 (new body)
    with BuildSketch(Plane(origin=(0, 0, -15.193), x_dir=(-1, 0, 0), z_dir=(0, 0, -1))):
        with Locations((1.25, -15.697)):
            Circle(ESQUISSE17_R)
    extrude(amount=BOSS_EXTRU_5_3_DEPTH)


solid = Compound([part.part, body_2.part, body_3.part, body_4.part])
